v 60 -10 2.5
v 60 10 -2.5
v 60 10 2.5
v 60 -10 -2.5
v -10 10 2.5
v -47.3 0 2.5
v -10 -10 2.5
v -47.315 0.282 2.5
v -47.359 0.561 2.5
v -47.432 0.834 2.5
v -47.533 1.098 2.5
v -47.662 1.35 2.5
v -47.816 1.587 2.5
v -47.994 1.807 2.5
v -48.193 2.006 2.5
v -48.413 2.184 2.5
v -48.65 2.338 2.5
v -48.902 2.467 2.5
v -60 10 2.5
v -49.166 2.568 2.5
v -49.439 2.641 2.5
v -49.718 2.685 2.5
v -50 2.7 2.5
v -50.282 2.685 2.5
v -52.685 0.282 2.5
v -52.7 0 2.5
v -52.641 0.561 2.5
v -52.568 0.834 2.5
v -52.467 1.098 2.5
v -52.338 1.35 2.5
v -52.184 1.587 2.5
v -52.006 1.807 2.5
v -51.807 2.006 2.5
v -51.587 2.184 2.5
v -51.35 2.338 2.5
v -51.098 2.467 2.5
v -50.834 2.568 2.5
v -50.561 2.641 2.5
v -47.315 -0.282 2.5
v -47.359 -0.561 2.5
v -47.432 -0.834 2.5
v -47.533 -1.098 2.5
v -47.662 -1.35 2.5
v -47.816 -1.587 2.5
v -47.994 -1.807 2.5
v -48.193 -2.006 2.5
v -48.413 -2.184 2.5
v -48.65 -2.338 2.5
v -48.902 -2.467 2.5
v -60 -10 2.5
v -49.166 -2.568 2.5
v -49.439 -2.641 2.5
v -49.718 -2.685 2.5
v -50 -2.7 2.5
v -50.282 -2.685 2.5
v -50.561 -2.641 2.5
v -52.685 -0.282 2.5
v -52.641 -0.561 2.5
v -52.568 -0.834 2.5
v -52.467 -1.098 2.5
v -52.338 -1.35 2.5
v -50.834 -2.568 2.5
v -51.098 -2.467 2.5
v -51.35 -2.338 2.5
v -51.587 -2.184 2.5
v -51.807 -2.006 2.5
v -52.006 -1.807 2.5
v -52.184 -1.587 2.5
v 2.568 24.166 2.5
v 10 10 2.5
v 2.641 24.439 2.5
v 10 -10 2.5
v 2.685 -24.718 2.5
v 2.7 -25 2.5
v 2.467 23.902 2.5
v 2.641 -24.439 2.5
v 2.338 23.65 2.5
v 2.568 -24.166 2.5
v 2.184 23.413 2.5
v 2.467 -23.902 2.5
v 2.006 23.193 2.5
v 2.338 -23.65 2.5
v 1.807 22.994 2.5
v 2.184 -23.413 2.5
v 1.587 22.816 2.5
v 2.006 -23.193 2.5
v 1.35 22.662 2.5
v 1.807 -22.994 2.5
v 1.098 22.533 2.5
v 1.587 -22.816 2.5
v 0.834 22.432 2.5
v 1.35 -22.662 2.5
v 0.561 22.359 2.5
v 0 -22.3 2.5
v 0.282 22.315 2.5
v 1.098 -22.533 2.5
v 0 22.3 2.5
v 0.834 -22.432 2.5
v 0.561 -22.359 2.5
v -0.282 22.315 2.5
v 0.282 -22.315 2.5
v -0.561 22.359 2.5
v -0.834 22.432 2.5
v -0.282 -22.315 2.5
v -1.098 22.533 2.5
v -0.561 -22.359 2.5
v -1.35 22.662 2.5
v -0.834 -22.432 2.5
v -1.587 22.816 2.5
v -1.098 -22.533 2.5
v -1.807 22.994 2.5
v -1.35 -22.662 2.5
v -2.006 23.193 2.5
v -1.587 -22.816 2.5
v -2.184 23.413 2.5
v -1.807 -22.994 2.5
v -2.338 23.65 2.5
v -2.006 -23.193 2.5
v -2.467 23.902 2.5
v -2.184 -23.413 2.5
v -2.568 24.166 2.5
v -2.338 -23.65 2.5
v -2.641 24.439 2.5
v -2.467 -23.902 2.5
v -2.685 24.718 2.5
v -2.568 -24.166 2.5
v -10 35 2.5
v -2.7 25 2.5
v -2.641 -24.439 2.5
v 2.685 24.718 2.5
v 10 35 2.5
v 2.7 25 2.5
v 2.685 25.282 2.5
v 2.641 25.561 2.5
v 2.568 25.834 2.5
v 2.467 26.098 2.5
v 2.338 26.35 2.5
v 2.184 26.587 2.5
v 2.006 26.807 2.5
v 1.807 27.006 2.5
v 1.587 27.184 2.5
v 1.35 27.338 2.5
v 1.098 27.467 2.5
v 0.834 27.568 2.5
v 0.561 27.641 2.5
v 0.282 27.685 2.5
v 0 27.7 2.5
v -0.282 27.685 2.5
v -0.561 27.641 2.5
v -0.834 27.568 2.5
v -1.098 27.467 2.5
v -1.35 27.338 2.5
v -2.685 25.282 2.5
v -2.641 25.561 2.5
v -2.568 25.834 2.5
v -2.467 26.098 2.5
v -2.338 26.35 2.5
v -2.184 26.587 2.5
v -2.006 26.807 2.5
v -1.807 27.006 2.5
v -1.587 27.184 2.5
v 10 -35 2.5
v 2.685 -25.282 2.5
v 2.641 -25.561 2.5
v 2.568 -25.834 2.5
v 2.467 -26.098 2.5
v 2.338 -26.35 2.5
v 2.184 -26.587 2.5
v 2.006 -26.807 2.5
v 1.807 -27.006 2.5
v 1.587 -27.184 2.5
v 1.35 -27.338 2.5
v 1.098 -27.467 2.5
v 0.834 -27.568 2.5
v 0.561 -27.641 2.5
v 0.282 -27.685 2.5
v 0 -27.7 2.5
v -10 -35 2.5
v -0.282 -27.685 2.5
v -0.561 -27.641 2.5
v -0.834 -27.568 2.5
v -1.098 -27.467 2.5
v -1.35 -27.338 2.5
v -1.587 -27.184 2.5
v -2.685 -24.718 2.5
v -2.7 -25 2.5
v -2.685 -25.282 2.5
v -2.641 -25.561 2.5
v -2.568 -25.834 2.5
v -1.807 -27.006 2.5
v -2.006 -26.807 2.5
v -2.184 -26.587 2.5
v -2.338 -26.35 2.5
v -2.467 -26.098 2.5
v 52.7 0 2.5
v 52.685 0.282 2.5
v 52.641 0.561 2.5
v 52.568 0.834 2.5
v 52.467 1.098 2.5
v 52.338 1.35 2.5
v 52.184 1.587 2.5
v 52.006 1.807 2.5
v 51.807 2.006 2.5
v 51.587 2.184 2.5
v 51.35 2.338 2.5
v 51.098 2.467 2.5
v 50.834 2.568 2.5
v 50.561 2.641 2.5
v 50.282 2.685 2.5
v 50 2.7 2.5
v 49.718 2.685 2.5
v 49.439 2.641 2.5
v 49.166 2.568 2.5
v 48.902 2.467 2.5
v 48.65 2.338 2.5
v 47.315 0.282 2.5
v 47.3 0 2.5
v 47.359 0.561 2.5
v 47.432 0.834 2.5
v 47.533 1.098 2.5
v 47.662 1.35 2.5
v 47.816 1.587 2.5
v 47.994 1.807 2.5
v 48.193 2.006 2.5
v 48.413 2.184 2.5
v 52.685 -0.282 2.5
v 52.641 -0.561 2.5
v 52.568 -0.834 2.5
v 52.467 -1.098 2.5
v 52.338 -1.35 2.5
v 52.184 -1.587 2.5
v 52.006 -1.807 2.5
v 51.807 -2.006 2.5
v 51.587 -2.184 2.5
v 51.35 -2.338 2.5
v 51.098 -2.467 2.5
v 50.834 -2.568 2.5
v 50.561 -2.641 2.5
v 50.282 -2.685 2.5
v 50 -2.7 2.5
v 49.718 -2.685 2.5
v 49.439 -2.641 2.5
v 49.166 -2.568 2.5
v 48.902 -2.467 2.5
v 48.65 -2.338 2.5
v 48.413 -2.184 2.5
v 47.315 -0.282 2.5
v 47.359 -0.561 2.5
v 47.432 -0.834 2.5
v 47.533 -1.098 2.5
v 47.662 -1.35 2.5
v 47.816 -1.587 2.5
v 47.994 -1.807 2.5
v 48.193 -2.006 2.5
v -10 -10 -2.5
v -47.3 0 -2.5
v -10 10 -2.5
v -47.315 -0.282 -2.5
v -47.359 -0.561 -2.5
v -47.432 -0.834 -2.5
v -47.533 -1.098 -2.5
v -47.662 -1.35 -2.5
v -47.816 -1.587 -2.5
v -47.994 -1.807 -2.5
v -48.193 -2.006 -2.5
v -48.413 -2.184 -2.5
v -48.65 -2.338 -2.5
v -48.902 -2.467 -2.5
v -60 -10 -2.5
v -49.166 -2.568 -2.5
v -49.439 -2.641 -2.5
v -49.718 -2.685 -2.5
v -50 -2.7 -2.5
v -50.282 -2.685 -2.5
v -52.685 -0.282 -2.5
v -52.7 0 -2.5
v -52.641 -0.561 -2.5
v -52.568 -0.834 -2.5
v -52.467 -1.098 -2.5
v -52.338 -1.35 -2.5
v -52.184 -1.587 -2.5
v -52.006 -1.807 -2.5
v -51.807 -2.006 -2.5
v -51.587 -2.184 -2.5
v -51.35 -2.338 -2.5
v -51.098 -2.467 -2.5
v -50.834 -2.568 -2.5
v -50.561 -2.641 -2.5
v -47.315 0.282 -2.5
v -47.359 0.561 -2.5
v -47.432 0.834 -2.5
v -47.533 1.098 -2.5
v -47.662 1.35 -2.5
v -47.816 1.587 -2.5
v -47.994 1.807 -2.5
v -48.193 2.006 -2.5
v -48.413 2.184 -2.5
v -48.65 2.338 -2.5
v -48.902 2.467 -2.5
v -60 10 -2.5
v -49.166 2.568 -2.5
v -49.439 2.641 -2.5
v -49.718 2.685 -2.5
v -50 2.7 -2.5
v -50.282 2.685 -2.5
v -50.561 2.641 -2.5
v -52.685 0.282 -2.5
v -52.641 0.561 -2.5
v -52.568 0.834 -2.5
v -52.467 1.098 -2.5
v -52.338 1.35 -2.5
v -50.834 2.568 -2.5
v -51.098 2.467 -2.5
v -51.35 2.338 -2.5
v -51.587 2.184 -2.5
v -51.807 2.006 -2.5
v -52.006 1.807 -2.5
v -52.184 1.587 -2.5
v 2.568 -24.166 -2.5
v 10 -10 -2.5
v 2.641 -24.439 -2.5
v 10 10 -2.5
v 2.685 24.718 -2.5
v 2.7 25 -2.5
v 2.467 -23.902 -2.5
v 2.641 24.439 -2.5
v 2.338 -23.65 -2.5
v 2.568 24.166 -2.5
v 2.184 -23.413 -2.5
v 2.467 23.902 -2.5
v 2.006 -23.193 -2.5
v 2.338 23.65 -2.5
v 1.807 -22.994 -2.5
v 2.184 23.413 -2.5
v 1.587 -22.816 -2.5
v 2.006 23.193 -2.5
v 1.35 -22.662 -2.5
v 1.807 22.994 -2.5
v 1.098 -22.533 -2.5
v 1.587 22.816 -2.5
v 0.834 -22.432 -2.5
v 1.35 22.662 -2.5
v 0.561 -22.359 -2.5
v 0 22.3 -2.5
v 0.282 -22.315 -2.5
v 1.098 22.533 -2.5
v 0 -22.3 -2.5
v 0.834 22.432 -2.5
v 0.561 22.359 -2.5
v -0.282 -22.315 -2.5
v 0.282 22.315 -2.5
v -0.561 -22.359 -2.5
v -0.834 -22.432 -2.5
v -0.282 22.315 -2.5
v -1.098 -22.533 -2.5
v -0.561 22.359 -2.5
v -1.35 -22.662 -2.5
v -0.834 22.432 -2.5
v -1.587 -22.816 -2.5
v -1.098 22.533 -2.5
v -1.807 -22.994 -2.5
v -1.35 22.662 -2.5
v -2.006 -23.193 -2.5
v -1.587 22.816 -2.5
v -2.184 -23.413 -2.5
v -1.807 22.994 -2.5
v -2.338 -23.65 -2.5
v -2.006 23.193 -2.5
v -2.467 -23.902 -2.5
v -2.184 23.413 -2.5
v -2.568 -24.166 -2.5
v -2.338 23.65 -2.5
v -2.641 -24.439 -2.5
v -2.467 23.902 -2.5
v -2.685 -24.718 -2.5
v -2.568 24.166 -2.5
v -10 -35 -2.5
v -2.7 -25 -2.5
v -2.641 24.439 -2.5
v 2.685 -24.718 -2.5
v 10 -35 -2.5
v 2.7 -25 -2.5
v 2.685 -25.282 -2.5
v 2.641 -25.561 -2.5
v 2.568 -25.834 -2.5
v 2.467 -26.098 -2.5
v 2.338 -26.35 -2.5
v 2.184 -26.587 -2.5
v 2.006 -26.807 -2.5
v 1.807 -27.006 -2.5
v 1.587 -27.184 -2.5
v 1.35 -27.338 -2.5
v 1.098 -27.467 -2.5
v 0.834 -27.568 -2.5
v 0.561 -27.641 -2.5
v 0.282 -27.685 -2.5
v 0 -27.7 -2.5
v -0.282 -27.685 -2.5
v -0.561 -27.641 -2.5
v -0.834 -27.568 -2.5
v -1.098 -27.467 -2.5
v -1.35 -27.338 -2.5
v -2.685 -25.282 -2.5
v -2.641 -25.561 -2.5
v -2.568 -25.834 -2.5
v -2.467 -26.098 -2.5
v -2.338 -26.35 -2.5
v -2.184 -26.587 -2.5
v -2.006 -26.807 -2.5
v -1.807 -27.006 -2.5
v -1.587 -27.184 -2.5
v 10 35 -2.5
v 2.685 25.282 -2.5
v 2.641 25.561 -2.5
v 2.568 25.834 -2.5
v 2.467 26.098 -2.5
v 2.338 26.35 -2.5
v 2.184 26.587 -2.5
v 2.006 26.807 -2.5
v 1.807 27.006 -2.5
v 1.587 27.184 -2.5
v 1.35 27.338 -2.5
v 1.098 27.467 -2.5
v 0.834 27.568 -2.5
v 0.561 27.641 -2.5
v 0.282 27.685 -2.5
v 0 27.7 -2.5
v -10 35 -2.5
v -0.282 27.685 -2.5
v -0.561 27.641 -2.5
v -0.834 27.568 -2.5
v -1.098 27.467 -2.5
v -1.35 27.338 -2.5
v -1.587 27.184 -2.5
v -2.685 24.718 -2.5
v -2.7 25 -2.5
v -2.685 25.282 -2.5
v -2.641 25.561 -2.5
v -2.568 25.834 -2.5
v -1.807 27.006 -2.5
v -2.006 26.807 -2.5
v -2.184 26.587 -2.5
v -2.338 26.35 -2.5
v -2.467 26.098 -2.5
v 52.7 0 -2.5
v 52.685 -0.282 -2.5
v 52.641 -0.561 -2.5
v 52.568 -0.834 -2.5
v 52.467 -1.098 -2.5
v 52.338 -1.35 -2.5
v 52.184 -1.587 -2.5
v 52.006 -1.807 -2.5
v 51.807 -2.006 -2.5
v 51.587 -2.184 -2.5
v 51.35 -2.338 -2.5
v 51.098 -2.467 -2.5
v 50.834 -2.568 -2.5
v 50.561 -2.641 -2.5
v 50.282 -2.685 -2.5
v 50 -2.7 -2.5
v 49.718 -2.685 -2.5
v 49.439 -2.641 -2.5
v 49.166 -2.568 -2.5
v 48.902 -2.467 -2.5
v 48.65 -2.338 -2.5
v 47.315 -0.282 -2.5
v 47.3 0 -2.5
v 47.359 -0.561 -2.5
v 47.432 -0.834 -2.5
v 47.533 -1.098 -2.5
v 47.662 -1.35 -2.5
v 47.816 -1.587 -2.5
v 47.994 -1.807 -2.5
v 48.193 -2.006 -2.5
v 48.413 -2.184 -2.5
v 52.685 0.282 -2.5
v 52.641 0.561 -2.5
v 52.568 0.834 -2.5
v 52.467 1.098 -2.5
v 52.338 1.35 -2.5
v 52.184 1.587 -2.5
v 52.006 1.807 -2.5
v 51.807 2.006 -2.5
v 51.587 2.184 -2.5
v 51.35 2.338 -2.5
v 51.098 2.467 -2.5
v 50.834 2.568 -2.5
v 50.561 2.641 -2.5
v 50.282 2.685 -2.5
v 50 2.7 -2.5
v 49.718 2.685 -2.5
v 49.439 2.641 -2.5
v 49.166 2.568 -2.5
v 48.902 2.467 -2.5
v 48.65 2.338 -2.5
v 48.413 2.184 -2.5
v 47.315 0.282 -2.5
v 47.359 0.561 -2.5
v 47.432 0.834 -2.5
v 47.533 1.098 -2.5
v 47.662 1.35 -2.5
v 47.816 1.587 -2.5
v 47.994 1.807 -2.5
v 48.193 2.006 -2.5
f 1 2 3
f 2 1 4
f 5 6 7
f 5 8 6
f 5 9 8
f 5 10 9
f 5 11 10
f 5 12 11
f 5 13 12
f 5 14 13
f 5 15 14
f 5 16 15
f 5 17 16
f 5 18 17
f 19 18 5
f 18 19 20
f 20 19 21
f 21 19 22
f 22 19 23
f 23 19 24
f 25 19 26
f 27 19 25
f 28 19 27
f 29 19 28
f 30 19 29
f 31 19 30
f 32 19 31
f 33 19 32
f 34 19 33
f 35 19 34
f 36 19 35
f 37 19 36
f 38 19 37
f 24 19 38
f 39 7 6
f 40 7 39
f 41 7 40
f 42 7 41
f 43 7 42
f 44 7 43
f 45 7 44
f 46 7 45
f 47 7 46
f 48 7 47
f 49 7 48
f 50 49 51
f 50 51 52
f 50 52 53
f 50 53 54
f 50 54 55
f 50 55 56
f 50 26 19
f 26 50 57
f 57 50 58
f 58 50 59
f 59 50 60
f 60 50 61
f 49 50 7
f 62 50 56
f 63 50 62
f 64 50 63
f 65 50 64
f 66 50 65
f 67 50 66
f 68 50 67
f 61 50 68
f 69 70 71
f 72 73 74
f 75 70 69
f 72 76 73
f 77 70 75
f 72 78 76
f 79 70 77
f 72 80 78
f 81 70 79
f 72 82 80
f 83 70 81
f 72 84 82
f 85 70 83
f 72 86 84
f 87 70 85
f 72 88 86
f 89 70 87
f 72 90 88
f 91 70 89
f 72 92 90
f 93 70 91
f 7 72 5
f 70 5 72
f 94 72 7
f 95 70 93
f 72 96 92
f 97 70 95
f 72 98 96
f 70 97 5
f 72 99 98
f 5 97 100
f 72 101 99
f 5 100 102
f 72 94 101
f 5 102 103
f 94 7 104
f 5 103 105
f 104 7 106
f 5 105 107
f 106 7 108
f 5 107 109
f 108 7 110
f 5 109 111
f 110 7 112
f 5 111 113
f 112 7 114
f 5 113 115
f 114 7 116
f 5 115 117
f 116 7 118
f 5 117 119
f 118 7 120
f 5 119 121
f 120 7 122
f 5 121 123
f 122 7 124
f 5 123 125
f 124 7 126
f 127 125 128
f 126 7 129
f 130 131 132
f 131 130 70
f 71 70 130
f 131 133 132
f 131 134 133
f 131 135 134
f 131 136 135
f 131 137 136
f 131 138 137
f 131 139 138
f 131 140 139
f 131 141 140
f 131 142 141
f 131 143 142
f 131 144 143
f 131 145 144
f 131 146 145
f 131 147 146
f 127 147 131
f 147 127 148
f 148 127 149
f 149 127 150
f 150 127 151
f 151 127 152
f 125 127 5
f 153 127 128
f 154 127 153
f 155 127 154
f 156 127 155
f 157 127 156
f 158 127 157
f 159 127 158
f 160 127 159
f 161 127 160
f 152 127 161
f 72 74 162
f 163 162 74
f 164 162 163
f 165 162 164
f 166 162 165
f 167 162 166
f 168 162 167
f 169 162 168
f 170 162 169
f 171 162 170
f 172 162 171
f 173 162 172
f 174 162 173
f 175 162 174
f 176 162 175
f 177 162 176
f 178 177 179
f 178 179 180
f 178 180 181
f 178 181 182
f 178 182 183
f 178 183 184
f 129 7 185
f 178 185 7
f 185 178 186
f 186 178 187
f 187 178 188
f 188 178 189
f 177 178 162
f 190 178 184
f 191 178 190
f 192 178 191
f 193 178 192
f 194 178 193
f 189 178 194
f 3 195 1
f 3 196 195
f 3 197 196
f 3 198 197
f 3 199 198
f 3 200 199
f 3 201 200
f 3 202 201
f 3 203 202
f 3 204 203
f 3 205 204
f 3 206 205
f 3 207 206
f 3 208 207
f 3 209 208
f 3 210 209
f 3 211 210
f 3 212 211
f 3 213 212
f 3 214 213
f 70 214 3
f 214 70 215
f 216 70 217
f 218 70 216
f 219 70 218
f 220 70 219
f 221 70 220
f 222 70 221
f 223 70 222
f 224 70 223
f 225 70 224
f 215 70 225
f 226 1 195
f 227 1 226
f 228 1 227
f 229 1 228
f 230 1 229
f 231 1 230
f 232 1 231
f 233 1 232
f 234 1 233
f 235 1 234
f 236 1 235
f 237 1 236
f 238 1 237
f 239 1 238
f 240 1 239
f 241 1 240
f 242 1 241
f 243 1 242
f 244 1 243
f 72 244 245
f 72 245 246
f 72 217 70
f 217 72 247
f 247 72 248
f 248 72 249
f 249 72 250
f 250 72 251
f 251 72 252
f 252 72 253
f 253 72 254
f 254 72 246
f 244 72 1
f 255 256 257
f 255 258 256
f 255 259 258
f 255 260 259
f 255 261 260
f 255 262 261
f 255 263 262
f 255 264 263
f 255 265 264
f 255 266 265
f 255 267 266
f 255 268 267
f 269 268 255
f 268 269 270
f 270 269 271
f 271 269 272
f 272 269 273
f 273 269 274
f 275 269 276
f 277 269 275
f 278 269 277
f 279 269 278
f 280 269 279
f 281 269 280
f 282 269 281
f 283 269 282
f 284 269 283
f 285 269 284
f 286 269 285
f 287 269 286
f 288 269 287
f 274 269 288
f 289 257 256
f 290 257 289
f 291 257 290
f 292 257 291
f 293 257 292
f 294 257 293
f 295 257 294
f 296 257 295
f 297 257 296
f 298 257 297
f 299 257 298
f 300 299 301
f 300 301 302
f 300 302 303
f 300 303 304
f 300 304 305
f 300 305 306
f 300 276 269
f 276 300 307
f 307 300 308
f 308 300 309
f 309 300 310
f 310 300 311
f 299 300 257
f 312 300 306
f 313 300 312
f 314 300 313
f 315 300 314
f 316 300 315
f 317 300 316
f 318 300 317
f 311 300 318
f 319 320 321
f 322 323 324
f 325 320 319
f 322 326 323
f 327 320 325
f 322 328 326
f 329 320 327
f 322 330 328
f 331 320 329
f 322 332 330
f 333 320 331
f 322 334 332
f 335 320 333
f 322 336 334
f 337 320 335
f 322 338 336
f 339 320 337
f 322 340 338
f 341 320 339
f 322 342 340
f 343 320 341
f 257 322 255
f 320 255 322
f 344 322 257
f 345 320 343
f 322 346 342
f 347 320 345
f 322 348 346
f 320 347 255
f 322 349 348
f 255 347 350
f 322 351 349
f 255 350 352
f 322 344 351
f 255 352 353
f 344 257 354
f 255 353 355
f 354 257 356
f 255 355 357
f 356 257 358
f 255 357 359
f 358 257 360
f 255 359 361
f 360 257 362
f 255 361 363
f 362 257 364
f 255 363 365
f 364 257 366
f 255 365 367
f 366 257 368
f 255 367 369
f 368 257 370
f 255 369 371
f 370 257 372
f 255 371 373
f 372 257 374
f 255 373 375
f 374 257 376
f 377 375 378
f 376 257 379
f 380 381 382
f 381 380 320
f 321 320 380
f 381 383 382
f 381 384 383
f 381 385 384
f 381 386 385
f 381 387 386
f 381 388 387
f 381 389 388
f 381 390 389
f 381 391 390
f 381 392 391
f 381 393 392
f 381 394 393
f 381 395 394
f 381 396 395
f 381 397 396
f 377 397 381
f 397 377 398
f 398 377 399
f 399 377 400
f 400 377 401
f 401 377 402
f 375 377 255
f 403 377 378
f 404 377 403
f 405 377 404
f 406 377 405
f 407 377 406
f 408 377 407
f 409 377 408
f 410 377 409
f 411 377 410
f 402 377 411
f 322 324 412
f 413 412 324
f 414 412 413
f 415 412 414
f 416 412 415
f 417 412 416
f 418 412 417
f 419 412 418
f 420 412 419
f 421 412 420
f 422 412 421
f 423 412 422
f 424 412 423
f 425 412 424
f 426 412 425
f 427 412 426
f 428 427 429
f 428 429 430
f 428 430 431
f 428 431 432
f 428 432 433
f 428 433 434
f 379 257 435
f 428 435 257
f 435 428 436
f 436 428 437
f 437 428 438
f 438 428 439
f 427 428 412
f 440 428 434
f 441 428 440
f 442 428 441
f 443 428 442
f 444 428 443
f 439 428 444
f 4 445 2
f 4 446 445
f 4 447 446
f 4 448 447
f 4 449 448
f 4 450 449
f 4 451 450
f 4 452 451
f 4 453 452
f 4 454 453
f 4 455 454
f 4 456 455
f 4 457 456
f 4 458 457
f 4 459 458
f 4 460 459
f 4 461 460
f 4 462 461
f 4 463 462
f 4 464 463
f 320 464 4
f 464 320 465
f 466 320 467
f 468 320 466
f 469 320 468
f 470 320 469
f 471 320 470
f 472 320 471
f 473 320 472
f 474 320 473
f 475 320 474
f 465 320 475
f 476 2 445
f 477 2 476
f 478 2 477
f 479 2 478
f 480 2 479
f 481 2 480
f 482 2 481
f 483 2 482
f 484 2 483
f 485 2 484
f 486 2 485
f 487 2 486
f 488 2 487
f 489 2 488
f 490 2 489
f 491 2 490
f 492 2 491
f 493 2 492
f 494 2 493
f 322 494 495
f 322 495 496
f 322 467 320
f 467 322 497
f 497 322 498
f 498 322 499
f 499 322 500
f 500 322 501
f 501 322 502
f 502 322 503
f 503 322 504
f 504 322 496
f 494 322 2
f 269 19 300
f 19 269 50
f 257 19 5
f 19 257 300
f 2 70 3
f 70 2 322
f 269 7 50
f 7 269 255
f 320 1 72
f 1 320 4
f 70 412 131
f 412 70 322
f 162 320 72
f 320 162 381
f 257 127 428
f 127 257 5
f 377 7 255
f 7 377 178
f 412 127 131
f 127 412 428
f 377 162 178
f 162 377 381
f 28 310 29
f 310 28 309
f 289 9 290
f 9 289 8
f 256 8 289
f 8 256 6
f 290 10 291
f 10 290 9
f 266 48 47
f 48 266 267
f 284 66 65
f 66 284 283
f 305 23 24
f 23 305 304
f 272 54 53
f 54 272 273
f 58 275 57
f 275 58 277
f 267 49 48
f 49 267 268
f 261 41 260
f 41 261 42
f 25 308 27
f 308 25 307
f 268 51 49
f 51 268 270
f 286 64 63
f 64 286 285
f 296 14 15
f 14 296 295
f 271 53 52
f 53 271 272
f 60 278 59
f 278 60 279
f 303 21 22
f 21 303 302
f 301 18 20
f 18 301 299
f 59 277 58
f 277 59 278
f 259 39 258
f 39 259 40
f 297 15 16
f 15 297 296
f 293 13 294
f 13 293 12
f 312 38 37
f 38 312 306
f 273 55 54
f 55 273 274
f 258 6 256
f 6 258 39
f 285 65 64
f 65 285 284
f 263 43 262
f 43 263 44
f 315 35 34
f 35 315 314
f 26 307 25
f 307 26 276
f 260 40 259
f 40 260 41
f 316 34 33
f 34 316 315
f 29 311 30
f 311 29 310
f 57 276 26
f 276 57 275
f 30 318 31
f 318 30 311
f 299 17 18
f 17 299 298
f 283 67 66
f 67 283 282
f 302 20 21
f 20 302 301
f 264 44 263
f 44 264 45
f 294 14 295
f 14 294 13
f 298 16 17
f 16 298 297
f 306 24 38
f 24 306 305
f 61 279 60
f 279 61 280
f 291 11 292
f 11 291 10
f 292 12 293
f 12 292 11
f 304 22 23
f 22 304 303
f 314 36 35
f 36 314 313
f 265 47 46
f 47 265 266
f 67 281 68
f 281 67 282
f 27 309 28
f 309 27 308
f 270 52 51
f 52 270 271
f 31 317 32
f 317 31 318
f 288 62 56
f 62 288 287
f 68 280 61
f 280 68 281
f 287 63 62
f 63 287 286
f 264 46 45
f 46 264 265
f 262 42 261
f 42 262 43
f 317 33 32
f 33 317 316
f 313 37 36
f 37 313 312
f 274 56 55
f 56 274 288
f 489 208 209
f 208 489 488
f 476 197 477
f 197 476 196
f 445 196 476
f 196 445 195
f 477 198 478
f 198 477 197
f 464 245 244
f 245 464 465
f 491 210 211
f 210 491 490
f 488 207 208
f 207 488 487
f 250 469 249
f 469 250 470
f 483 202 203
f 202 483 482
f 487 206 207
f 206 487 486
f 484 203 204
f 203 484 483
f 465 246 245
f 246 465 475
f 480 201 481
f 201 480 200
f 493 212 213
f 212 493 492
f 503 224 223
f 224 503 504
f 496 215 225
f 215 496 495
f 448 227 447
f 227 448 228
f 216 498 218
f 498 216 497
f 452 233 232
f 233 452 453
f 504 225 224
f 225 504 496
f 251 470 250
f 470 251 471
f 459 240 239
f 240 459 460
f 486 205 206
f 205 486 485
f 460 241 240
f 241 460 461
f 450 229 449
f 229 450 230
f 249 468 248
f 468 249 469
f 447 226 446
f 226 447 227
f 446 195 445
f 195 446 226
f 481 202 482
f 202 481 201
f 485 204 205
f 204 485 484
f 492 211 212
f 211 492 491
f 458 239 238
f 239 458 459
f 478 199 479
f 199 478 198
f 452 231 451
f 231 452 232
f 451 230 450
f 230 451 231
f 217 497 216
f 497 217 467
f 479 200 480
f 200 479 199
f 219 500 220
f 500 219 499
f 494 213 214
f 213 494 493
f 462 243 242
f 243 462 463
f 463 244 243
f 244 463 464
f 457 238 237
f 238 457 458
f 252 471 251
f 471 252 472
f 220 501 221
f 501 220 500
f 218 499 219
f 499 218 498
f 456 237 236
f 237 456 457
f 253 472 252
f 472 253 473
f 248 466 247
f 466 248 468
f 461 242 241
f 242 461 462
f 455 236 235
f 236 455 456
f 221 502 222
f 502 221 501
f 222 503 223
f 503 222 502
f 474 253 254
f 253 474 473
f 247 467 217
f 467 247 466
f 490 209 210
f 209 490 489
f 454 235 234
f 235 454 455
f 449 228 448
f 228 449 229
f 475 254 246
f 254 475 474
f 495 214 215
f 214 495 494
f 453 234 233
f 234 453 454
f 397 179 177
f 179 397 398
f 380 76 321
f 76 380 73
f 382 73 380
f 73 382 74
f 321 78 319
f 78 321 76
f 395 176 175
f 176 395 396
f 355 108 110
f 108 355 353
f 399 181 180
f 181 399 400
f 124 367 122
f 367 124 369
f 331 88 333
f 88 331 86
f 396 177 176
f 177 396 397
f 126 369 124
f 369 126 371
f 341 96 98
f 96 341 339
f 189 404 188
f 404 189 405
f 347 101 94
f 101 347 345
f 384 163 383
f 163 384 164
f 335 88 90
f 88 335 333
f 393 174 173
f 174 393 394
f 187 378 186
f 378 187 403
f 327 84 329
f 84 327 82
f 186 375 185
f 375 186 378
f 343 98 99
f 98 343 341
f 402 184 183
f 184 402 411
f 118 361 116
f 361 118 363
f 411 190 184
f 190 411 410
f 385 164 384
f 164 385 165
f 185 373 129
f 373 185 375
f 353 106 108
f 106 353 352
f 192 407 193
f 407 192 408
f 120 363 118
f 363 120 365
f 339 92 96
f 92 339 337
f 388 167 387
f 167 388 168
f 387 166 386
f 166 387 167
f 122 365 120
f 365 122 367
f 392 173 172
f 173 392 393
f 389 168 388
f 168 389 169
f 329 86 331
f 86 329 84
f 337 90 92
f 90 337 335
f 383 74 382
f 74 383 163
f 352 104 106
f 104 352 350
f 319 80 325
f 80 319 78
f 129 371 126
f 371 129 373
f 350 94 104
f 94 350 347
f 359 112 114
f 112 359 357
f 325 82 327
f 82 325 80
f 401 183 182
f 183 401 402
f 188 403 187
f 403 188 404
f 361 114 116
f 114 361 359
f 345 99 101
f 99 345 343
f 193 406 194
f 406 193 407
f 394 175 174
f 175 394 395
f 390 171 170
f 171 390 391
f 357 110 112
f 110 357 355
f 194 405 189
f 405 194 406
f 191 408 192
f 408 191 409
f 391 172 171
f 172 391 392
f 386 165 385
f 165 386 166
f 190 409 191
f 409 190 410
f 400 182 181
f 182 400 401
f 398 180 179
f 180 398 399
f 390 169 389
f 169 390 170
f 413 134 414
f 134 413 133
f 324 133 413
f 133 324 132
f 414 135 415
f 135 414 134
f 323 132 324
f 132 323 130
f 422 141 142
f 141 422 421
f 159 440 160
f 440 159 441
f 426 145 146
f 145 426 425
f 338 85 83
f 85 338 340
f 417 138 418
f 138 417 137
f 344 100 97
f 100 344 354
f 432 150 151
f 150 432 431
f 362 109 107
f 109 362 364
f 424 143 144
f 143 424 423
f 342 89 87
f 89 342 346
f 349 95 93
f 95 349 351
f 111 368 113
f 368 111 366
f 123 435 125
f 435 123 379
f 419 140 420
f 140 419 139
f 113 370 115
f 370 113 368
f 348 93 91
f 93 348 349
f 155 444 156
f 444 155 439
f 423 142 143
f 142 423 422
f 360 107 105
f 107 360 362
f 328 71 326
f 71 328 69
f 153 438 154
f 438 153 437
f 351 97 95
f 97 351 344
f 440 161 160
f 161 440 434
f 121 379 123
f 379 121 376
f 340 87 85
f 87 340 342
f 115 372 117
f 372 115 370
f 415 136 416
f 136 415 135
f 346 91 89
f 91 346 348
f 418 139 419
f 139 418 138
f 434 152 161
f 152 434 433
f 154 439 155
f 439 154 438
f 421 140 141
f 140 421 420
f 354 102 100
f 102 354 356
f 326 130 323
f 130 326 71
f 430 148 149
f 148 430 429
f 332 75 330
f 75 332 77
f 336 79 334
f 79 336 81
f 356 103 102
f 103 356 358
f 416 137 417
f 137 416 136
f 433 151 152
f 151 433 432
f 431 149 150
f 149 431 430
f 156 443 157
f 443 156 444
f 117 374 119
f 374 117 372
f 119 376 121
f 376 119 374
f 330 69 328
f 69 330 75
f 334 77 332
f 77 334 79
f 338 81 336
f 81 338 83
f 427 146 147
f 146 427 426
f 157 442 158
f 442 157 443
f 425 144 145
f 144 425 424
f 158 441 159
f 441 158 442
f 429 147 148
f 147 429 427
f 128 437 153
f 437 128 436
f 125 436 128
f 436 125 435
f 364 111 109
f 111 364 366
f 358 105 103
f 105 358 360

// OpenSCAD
// T-shaped mounting plate.
$fn = 60;
eps = 0.02;
stem_l = 120;
arm_l = 70;
width = 20;
thickness = 5;
difference() {
    union() { cube([stem_l,width,thickness],center=true); cube([width,arm_l,thickness],center=true); }
    for (p=[[-stem_l/2+10,0],[stem_l/2-10,0],[0,-arm_l/2+10],[0,arm_l/2-10]]) translate([p[0],p[1],-thickness/2-eps]) cylinder(d=5.4,h=thickness+2*eps);
}
